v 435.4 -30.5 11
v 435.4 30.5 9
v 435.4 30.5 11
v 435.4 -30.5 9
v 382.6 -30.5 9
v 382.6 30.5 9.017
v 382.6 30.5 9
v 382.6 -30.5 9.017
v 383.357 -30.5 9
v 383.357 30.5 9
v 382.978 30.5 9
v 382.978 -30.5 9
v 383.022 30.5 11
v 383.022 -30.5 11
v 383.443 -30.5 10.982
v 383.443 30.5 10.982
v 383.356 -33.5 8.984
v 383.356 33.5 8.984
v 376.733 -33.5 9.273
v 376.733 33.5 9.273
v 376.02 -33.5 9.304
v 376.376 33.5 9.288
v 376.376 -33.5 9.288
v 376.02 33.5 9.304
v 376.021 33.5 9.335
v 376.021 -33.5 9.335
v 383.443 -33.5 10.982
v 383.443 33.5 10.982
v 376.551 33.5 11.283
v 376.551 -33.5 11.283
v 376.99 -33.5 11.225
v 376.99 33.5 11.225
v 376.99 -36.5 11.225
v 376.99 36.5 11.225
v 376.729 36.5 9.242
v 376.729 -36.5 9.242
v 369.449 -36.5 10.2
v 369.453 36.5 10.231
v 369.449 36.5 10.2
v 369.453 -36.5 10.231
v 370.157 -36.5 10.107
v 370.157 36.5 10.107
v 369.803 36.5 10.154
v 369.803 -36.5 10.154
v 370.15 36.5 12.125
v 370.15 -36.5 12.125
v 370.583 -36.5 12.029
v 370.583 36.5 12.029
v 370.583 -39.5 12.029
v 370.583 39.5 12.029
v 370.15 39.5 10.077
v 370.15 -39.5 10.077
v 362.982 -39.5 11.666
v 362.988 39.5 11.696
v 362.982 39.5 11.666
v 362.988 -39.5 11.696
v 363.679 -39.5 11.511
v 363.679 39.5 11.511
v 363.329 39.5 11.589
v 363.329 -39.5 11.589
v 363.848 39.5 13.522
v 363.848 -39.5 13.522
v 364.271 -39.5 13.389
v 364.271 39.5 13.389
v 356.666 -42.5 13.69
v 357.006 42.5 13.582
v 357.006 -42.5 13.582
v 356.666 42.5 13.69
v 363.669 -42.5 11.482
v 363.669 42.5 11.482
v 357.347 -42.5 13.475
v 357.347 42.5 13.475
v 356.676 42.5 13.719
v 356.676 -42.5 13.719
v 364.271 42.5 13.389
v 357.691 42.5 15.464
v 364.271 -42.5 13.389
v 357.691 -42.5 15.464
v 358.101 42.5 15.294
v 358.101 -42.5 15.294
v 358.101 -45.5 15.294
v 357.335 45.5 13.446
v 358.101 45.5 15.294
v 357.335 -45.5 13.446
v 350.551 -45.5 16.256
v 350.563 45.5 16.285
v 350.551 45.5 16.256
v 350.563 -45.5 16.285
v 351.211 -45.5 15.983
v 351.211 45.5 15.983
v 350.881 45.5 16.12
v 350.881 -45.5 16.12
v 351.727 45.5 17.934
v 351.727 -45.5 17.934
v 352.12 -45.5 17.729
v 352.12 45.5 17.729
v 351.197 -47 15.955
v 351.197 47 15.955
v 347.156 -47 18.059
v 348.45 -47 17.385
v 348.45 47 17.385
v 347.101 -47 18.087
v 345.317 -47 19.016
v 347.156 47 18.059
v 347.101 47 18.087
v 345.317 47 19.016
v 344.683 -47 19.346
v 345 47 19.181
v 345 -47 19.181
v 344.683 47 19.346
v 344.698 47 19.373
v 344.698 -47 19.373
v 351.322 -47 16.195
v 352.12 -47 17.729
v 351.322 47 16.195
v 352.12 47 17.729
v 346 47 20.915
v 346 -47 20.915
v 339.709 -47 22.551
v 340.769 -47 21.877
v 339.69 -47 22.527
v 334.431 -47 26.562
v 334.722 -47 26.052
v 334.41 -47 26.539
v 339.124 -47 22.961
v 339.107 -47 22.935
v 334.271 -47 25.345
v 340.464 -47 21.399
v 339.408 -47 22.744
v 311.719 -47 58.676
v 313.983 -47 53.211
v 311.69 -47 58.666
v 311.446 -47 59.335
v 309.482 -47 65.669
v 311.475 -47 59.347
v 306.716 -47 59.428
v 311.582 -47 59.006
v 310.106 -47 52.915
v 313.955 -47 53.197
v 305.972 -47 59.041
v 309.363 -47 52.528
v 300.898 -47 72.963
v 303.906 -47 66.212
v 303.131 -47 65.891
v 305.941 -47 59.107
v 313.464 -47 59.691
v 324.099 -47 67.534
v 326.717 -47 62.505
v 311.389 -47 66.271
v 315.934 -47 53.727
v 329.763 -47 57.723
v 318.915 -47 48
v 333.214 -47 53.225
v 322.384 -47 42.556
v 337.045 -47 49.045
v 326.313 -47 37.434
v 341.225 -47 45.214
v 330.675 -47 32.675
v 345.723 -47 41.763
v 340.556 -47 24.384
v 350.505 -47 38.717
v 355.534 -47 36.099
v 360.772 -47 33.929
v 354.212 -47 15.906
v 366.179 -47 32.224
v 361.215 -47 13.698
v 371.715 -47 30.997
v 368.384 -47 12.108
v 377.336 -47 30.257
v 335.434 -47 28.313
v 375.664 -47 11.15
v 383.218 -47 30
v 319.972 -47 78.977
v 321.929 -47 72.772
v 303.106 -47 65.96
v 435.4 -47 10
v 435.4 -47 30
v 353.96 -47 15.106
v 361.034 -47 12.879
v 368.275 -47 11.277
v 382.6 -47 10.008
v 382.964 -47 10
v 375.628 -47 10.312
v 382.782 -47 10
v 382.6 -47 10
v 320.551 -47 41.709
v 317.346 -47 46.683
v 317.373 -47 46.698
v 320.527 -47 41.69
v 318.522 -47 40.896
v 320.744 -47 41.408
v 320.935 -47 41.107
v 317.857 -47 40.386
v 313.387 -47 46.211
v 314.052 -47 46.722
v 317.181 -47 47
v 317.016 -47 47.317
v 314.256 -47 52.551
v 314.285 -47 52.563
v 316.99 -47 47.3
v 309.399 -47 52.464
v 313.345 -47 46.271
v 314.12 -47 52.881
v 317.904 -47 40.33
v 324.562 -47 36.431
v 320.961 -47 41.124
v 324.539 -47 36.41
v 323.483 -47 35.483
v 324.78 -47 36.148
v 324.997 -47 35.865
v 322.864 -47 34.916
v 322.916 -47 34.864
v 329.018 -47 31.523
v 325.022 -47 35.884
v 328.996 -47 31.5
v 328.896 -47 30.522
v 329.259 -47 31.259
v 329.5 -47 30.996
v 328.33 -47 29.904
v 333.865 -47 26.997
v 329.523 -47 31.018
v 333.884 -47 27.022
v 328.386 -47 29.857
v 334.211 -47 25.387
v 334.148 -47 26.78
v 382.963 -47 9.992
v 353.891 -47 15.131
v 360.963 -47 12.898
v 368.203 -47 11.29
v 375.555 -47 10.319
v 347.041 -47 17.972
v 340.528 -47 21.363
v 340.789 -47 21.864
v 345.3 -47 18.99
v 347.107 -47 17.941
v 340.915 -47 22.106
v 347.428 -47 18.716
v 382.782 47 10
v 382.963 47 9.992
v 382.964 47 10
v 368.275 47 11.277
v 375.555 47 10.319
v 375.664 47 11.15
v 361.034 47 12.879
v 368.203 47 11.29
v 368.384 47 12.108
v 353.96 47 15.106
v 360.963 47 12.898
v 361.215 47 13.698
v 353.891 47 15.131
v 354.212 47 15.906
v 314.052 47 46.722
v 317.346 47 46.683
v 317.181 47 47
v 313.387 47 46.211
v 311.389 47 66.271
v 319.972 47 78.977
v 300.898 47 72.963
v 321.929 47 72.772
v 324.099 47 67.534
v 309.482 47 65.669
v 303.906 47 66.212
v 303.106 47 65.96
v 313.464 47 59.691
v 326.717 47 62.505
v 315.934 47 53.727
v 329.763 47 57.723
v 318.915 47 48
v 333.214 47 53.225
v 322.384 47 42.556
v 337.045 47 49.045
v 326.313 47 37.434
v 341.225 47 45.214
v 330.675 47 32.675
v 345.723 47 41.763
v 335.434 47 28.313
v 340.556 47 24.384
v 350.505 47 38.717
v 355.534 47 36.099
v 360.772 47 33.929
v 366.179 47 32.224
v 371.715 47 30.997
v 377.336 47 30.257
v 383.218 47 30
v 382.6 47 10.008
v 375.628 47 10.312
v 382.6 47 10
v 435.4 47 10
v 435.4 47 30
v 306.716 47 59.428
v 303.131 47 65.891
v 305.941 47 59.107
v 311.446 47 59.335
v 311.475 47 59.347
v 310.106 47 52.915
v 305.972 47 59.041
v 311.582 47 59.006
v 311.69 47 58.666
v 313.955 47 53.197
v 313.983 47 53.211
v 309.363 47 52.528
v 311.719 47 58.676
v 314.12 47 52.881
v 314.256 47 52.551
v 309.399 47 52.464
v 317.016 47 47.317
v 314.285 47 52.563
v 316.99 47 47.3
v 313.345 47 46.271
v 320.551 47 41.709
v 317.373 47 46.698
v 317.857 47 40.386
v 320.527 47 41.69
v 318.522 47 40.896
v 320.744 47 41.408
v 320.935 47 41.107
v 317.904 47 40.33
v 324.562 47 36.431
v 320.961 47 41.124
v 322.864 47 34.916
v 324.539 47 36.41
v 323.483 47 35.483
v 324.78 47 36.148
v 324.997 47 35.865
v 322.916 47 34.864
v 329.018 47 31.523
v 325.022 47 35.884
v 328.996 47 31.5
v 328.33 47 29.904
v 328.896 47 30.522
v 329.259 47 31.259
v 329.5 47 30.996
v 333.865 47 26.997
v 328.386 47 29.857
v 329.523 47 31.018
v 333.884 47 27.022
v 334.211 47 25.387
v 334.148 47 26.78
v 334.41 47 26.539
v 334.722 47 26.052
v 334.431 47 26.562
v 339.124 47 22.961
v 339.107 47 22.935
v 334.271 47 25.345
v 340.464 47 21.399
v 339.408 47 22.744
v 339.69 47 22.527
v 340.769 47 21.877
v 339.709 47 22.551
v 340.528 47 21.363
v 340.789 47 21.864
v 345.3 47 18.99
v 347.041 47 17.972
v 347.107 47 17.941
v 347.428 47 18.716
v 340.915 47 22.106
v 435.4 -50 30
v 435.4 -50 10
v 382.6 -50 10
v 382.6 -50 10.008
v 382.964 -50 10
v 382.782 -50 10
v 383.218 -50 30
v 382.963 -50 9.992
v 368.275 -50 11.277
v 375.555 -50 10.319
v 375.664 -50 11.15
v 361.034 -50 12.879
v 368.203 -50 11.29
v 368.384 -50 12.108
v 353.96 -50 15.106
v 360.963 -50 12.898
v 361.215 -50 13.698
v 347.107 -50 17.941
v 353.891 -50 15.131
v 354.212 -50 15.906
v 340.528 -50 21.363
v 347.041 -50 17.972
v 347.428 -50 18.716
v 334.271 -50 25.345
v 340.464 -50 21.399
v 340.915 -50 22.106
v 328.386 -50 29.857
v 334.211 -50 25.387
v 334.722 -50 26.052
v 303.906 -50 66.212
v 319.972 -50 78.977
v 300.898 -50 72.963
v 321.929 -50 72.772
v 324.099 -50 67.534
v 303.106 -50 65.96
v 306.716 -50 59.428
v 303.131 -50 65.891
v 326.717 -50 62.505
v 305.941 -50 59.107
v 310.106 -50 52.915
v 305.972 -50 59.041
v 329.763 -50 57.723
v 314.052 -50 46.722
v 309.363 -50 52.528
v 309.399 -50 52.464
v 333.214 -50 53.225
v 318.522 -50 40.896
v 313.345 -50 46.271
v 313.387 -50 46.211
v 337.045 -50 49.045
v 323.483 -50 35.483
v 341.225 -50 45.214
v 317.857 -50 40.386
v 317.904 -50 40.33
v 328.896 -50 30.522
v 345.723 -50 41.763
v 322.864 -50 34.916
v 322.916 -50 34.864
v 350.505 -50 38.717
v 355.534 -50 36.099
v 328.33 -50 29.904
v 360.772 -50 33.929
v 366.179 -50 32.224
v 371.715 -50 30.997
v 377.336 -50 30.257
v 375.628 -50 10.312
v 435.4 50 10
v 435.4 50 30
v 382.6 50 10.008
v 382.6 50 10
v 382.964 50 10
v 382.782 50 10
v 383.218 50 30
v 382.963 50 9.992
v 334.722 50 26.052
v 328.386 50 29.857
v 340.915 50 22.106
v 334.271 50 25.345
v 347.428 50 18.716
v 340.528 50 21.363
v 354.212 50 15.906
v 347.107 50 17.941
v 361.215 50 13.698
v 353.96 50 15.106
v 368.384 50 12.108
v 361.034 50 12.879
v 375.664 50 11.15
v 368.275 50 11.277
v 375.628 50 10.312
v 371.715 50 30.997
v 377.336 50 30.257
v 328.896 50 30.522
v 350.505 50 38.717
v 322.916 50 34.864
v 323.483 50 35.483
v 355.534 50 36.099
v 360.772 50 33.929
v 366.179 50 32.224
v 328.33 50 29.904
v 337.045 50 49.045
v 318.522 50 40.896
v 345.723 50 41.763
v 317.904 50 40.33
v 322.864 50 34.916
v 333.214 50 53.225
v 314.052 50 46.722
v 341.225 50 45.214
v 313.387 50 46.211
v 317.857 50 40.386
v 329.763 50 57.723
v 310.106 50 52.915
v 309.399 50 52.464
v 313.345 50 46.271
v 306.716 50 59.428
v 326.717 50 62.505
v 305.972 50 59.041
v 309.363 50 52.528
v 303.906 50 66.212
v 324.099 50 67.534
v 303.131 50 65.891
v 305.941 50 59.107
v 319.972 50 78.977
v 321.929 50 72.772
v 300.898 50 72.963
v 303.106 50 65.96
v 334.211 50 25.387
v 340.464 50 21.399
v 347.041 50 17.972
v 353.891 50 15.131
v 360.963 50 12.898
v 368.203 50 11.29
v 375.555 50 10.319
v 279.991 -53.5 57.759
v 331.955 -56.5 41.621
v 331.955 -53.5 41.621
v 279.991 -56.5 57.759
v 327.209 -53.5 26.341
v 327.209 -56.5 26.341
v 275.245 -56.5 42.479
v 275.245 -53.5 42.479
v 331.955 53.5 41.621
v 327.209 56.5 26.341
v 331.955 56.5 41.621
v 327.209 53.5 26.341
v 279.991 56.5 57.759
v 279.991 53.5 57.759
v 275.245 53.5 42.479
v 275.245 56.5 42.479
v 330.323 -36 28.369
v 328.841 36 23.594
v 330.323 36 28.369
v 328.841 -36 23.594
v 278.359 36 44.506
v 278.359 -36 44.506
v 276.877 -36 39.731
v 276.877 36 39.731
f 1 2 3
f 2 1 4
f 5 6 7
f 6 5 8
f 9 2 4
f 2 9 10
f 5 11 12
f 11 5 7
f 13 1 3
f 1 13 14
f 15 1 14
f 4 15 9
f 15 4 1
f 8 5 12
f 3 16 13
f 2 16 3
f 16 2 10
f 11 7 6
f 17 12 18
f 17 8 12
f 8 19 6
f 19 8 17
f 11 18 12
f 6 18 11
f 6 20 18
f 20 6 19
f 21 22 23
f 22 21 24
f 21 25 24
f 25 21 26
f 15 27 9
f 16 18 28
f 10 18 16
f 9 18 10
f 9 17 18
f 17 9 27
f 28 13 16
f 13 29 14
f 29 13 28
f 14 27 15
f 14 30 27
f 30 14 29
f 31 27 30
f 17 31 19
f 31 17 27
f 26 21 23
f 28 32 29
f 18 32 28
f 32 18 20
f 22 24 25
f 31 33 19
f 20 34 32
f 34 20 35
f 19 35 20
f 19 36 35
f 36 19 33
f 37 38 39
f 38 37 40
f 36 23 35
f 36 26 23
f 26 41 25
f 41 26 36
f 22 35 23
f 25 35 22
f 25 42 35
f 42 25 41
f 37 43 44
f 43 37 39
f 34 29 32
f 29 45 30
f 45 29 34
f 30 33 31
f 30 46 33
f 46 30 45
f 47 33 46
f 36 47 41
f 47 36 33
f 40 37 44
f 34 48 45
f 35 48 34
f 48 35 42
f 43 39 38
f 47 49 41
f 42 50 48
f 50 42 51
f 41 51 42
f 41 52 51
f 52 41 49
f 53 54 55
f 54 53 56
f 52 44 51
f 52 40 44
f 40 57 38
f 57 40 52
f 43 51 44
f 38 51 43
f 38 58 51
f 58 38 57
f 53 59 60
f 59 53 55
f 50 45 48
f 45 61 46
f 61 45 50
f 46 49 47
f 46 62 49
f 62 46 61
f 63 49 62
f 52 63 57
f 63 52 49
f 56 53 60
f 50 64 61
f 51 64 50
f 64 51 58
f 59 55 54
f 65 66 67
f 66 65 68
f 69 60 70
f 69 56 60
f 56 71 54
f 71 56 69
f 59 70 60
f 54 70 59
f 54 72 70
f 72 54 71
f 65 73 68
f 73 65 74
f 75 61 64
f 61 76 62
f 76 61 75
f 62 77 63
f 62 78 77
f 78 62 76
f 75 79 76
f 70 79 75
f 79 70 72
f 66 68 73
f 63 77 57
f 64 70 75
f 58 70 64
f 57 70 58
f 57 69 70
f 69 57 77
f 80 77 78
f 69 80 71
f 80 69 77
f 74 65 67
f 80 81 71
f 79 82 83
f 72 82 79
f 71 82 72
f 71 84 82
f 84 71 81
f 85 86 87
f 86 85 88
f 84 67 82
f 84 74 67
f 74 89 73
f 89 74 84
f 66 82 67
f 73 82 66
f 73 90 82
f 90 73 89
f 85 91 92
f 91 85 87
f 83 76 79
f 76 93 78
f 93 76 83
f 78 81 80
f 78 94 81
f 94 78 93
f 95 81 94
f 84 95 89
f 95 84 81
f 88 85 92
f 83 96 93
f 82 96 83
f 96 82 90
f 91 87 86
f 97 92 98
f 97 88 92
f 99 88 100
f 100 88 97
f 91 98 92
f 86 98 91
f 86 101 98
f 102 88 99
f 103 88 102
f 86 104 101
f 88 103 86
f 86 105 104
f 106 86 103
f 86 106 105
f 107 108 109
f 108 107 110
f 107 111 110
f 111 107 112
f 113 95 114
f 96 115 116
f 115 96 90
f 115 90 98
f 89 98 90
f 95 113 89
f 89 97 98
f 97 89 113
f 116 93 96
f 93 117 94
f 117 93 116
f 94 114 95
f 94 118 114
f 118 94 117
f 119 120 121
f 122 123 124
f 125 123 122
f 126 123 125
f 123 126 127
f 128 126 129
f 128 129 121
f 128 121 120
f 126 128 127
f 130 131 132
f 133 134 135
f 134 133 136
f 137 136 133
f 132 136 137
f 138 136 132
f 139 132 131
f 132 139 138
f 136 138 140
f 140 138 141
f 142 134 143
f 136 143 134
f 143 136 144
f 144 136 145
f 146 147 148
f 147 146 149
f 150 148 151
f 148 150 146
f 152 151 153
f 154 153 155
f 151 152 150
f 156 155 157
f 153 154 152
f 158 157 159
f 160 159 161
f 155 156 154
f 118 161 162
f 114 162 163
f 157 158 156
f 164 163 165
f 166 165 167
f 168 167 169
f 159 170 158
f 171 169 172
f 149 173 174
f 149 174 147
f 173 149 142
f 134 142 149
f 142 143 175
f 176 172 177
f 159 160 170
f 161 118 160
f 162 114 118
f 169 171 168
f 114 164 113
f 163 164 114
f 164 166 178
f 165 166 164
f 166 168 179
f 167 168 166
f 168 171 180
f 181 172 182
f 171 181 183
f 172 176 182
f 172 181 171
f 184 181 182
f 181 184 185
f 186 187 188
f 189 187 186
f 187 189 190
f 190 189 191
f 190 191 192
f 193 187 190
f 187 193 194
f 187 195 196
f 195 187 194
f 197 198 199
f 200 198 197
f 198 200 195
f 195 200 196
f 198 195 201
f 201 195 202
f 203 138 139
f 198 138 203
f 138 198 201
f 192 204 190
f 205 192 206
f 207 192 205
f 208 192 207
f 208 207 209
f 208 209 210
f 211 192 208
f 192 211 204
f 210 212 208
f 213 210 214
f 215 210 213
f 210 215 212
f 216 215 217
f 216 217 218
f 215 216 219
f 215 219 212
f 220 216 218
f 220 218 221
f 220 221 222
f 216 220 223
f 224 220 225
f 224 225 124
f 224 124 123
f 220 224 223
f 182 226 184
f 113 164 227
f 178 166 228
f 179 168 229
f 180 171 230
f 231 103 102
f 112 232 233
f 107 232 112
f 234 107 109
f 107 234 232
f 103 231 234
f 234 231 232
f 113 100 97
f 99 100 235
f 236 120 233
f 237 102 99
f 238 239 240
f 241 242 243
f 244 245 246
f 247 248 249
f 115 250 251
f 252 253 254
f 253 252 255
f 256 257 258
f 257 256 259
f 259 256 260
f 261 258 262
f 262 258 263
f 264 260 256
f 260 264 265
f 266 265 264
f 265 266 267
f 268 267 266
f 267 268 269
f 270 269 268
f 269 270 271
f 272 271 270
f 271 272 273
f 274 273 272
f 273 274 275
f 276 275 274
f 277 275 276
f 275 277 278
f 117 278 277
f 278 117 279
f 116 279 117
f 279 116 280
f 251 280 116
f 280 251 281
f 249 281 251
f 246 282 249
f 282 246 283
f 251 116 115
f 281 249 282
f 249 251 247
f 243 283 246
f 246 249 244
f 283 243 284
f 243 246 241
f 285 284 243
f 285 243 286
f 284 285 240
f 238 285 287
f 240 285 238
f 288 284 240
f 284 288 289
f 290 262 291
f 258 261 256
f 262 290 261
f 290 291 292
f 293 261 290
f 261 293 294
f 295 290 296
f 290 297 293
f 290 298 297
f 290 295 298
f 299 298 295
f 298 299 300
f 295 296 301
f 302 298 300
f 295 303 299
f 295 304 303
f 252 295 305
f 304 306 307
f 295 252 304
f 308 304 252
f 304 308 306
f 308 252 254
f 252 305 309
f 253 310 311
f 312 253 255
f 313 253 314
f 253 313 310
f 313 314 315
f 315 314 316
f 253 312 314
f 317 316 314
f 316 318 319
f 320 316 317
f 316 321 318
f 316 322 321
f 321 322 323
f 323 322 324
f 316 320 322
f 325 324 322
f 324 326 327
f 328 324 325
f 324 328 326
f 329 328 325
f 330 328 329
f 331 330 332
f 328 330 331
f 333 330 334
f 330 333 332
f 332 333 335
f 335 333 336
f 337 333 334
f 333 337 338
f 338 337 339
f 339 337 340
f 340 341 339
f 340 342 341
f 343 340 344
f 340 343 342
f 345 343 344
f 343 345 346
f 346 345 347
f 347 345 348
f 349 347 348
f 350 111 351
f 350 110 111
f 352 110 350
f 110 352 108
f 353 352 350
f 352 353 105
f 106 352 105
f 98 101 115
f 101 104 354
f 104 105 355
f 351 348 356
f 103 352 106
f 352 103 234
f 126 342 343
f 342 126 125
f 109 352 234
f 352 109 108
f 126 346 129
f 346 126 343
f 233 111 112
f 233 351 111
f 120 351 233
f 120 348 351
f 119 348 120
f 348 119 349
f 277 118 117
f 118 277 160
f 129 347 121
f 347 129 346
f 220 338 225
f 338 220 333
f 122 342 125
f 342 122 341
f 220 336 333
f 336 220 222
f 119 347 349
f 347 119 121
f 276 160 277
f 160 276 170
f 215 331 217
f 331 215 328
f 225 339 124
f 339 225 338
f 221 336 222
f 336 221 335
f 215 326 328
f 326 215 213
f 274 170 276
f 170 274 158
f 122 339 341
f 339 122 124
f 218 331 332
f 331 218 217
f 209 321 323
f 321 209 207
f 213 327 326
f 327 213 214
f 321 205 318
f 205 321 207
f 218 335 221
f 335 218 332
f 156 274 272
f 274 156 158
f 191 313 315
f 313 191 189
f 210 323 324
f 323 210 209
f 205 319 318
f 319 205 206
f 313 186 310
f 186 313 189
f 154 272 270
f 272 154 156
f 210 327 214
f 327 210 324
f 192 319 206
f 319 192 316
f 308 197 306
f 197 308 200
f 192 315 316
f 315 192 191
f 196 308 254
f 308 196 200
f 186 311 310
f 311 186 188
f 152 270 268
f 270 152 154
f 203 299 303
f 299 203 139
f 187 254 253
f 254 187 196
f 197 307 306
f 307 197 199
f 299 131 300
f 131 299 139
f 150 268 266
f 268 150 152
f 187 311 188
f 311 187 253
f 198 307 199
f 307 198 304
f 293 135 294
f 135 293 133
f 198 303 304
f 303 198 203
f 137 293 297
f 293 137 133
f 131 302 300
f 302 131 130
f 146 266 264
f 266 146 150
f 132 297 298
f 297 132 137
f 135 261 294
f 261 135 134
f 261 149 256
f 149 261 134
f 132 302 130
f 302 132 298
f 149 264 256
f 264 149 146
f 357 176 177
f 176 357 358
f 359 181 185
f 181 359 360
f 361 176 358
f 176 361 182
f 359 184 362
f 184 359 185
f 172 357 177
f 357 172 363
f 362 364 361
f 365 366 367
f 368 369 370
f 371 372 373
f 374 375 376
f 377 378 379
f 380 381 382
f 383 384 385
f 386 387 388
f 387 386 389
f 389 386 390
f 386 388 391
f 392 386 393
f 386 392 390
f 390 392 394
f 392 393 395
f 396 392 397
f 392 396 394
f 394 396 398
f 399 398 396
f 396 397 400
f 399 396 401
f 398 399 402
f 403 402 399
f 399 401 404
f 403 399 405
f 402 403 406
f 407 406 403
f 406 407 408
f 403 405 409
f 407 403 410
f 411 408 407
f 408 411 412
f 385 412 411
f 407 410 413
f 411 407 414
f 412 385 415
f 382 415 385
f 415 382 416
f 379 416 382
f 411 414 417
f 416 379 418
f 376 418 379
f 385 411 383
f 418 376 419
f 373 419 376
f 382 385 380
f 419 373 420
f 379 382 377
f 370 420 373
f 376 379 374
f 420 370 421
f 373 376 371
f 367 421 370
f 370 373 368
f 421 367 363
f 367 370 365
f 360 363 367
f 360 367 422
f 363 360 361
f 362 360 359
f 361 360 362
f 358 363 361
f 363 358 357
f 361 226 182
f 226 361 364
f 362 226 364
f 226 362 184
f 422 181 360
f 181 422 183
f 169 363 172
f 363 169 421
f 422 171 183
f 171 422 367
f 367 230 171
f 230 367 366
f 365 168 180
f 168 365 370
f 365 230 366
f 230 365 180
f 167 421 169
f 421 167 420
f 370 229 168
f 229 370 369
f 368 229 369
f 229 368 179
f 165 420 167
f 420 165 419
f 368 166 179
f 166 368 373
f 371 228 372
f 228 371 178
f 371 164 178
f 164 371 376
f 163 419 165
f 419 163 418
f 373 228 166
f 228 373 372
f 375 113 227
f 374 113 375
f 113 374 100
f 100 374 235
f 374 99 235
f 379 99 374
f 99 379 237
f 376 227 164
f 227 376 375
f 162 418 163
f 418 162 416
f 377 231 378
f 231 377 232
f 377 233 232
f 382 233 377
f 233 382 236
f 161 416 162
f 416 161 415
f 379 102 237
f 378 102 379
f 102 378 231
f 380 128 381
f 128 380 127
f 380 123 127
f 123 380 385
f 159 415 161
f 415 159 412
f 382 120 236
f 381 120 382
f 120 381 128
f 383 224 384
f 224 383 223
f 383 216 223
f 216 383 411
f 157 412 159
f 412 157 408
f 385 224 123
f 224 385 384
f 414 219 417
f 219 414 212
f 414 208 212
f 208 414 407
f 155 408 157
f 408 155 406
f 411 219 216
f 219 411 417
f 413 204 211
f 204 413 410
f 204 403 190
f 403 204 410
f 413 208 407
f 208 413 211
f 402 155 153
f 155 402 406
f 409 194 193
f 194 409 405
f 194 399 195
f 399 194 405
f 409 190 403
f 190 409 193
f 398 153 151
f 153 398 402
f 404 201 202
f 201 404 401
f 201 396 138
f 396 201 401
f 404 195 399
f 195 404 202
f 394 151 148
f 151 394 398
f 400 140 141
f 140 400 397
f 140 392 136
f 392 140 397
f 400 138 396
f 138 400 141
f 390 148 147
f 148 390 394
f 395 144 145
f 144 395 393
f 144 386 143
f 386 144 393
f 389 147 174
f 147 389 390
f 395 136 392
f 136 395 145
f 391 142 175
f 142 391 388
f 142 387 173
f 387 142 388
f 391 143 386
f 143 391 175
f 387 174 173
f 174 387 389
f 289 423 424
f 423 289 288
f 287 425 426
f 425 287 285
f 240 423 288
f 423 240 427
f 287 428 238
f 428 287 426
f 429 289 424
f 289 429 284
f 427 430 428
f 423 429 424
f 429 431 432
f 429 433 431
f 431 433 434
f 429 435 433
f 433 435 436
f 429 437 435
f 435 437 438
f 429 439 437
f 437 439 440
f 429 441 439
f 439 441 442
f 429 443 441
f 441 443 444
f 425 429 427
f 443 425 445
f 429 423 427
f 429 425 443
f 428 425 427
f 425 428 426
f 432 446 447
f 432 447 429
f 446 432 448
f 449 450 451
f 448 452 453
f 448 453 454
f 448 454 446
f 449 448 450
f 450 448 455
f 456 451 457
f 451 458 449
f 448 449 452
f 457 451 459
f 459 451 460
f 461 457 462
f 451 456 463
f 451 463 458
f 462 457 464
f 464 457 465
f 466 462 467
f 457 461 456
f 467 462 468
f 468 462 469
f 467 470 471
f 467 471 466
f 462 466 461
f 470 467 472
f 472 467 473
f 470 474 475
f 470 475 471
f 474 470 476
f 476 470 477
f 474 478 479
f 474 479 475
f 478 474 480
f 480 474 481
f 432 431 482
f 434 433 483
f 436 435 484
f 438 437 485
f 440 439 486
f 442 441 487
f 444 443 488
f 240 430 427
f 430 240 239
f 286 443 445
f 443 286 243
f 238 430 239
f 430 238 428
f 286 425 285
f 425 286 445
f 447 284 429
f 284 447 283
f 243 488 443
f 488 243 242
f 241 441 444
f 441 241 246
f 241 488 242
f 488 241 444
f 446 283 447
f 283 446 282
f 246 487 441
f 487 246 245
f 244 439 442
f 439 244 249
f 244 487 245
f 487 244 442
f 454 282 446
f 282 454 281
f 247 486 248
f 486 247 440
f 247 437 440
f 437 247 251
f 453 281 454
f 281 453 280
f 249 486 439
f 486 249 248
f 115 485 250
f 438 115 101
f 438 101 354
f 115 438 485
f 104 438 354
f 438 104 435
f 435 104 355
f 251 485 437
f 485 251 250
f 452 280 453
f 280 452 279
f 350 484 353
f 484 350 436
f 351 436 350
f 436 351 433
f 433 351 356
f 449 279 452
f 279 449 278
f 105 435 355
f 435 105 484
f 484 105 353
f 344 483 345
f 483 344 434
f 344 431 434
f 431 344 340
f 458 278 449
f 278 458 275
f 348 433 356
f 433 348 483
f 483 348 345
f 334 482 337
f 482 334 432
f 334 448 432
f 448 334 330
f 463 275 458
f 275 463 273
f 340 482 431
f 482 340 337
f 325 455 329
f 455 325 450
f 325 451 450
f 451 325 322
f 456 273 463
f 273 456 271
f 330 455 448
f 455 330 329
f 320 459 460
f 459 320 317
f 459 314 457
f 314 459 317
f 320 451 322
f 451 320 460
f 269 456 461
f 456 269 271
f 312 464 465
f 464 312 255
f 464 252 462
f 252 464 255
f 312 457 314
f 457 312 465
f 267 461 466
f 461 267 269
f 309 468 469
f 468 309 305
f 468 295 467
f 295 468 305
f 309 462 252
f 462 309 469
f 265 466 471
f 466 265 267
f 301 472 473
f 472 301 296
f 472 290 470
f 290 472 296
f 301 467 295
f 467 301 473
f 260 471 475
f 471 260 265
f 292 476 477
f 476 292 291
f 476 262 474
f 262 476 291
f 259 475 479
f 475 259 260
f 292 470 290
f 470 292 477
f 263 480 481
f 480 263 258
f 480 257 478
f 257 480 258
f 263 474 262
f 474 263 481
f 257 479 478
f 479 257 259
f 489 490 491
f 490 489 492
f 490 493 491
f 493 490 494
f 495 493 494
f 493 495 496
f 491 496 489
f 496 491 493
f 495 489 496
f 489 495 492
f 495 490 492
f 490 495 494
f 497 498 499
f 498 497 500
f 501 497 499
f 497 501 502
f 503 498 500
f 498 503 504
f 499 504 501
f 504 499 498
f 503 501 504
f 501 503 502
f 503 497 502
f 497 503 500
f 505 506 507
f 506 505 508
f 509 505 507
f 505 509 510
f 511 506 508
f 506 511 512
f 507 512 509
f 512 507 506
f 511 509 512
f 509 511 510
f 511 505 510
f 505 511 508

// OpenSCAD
// P2-74 dependent-only selector-rail study.
// Only the P2-68 selector-nose rail Y positions may change.
// Units mm; +X front, +Y left, +Z up.
use <shared-flywheel-transition-p252.scad>
use <shared-flywheel-p267-tilted-arch.scad>
use <shared-flywheel-p268-upright-wall.scad>

p274_view = "assembly";
p274_angle = 15;
p274_rail_y = 55;
p274_wheel_y = 129; // frozen P2-40: (D200 + 58 mm centre gap) / 2
$fn = 48;

module p274_selector_floor(angle=p274_angle) {
    p268_xz_strip([278,42],p268_mouth_floor(angle),72,5);
}

module p274_selector_rails(angle=p274_angle,rail_y=p274_rail_y) {
    p268_xz_rails_at_y([278,42],p268_mouth_floor(angle),rail_y,3,16);
}

module p274_selector_nose(angle=p274_angle,rail_y=p274_rail_y) {
    p274_selector_floor(angle);
    p274_selector_rails(angle,rail_y);
}

module p274_ski_walls() {
    pts=p267_ski_points(75);
    for(side=[-1,1],i=[0:len(pts)-2]) {
        p0=pts[i]; p1=pts[i+1];
        dx=p1[0]-p0[0]; dz=p1[1]-p0[1]; l=sqrt(dx*dx+dz*dz); a=atan2(dz,dx);
        translate([(p0[0]+p1[0])/2,side*48.5,(p0[1]+p1[1])/2+10])
            rotate([0,-a,0]) cube([l+.8,3,20],center=true);
    }
}

module p274_ski_complete() {
    p267_ski(75);
    p274_ski_walls();
}

module p274_launcher_sweep() {
    union() for(a=[-10:1:20]) p253_frozen_launcher(a);
}

module p274_plate_sweep() {
    union() for(a=[-10:1:20]) module_pose(a) upper_plate();
}

module p274_wheel_sweep() {
    union() for(a=[-10:1:20]) module_pose(a)
        for(yy=[-p274_wheel_y,p274_wheel_y]) wheel_and_motor(yy);
}

module p274_closed_feed() {
    p268_fixed_feed_channel();
    p268_feed_door(0,false);
}

if(p274_view=="assembly") {
    color([.08,.62,.82]) p274_ski_complete();
    color([.82,.58,.12]) p274_selector_nose(p274_angle,p274_rail_y);
}
else if(p274_view=="qa_ski_rails") intersection() {
    p274_ski_complete(); p274_selector_rails(p274_angle,p274_rail_y);
}
else if(p274_view=="qa_ski_floor") intersection() {
    p274_ski_complete(); p274_selector_floor(p274_angle);
}
else if(p274_view=="qa_launcher_rails") intersection() {
    p274_selector_rails(p274_angle,p274_rail_y); p274_launcher_sweep();
}
else if(p274_view=="qa_launcher_floor") intersection() {
    p274_selector_floor(p274_angle); p274_launcher_sweep();
}
else if(p274_view=="qa_plate_rails") intersection() {
    p274_selector_rails(p274_angle,p274_rail_y); p274_plate_sweep();
}
else if(p274_view=="qa_wheels_rails") intersection() {
    p274_selector_rails(p274_angle,p274_rail_y); p274_wheel_sweep();
}
else if(p274_view=="qa_plate_floor") intersection() {
    p274_selector_floor(p274_angle); p274_plate_sweep();
}
else if(p274_view=="qa_wheels_floor") intersection() {
    p274_selector_floor(p274_angle); p274_wheel_sweep();
}
else if(p274_view=="qa_closed_rails") intersection() {
    p274_selector_rails(p274_angle,p274_rail_y); p274_closed_feed();
}
else if(p274_view=="qa_closed_floor") intersection() {
    p274_selector_floor(p274_angle); p274_closed_feed();
}
else if(p274_view=="qa_door_rails") intersection() {
    p274_selector_rails(p274_angle,p274_rail_y); p268_feed_door(0,false);
}
else if(p274_view=="qa_door_floor") intersection() {
    p274_selector_floor(p274_angle); p268_feed_door(0,false);
}
else if(p274_view=="qa_channel_rails") intersection() {
    p274_selector_rails(p274_angle,p274_rail_y); p268_fixed_feed_channel();
}
else if(p274_view=="qa_channel_floor") intersection() {
    p274_selector_floor(p274_angle); p268_fixed_feed_channel();
}
else if(p274_view=="side") rotate([-90,0,0]) {
    color([.08,.62,.82]) p274_ski_complete();
    color([.82,.58,.12]) p274_selector_nose(p274_angle,p274_rail_y);
}
else if(p274_view=="top") {
    color([.08,.62,.82]) p274_ski_complete();
    color([.82,.58,.12]) p274_selector_nose(p274_angle,p274_rail_y);
}
